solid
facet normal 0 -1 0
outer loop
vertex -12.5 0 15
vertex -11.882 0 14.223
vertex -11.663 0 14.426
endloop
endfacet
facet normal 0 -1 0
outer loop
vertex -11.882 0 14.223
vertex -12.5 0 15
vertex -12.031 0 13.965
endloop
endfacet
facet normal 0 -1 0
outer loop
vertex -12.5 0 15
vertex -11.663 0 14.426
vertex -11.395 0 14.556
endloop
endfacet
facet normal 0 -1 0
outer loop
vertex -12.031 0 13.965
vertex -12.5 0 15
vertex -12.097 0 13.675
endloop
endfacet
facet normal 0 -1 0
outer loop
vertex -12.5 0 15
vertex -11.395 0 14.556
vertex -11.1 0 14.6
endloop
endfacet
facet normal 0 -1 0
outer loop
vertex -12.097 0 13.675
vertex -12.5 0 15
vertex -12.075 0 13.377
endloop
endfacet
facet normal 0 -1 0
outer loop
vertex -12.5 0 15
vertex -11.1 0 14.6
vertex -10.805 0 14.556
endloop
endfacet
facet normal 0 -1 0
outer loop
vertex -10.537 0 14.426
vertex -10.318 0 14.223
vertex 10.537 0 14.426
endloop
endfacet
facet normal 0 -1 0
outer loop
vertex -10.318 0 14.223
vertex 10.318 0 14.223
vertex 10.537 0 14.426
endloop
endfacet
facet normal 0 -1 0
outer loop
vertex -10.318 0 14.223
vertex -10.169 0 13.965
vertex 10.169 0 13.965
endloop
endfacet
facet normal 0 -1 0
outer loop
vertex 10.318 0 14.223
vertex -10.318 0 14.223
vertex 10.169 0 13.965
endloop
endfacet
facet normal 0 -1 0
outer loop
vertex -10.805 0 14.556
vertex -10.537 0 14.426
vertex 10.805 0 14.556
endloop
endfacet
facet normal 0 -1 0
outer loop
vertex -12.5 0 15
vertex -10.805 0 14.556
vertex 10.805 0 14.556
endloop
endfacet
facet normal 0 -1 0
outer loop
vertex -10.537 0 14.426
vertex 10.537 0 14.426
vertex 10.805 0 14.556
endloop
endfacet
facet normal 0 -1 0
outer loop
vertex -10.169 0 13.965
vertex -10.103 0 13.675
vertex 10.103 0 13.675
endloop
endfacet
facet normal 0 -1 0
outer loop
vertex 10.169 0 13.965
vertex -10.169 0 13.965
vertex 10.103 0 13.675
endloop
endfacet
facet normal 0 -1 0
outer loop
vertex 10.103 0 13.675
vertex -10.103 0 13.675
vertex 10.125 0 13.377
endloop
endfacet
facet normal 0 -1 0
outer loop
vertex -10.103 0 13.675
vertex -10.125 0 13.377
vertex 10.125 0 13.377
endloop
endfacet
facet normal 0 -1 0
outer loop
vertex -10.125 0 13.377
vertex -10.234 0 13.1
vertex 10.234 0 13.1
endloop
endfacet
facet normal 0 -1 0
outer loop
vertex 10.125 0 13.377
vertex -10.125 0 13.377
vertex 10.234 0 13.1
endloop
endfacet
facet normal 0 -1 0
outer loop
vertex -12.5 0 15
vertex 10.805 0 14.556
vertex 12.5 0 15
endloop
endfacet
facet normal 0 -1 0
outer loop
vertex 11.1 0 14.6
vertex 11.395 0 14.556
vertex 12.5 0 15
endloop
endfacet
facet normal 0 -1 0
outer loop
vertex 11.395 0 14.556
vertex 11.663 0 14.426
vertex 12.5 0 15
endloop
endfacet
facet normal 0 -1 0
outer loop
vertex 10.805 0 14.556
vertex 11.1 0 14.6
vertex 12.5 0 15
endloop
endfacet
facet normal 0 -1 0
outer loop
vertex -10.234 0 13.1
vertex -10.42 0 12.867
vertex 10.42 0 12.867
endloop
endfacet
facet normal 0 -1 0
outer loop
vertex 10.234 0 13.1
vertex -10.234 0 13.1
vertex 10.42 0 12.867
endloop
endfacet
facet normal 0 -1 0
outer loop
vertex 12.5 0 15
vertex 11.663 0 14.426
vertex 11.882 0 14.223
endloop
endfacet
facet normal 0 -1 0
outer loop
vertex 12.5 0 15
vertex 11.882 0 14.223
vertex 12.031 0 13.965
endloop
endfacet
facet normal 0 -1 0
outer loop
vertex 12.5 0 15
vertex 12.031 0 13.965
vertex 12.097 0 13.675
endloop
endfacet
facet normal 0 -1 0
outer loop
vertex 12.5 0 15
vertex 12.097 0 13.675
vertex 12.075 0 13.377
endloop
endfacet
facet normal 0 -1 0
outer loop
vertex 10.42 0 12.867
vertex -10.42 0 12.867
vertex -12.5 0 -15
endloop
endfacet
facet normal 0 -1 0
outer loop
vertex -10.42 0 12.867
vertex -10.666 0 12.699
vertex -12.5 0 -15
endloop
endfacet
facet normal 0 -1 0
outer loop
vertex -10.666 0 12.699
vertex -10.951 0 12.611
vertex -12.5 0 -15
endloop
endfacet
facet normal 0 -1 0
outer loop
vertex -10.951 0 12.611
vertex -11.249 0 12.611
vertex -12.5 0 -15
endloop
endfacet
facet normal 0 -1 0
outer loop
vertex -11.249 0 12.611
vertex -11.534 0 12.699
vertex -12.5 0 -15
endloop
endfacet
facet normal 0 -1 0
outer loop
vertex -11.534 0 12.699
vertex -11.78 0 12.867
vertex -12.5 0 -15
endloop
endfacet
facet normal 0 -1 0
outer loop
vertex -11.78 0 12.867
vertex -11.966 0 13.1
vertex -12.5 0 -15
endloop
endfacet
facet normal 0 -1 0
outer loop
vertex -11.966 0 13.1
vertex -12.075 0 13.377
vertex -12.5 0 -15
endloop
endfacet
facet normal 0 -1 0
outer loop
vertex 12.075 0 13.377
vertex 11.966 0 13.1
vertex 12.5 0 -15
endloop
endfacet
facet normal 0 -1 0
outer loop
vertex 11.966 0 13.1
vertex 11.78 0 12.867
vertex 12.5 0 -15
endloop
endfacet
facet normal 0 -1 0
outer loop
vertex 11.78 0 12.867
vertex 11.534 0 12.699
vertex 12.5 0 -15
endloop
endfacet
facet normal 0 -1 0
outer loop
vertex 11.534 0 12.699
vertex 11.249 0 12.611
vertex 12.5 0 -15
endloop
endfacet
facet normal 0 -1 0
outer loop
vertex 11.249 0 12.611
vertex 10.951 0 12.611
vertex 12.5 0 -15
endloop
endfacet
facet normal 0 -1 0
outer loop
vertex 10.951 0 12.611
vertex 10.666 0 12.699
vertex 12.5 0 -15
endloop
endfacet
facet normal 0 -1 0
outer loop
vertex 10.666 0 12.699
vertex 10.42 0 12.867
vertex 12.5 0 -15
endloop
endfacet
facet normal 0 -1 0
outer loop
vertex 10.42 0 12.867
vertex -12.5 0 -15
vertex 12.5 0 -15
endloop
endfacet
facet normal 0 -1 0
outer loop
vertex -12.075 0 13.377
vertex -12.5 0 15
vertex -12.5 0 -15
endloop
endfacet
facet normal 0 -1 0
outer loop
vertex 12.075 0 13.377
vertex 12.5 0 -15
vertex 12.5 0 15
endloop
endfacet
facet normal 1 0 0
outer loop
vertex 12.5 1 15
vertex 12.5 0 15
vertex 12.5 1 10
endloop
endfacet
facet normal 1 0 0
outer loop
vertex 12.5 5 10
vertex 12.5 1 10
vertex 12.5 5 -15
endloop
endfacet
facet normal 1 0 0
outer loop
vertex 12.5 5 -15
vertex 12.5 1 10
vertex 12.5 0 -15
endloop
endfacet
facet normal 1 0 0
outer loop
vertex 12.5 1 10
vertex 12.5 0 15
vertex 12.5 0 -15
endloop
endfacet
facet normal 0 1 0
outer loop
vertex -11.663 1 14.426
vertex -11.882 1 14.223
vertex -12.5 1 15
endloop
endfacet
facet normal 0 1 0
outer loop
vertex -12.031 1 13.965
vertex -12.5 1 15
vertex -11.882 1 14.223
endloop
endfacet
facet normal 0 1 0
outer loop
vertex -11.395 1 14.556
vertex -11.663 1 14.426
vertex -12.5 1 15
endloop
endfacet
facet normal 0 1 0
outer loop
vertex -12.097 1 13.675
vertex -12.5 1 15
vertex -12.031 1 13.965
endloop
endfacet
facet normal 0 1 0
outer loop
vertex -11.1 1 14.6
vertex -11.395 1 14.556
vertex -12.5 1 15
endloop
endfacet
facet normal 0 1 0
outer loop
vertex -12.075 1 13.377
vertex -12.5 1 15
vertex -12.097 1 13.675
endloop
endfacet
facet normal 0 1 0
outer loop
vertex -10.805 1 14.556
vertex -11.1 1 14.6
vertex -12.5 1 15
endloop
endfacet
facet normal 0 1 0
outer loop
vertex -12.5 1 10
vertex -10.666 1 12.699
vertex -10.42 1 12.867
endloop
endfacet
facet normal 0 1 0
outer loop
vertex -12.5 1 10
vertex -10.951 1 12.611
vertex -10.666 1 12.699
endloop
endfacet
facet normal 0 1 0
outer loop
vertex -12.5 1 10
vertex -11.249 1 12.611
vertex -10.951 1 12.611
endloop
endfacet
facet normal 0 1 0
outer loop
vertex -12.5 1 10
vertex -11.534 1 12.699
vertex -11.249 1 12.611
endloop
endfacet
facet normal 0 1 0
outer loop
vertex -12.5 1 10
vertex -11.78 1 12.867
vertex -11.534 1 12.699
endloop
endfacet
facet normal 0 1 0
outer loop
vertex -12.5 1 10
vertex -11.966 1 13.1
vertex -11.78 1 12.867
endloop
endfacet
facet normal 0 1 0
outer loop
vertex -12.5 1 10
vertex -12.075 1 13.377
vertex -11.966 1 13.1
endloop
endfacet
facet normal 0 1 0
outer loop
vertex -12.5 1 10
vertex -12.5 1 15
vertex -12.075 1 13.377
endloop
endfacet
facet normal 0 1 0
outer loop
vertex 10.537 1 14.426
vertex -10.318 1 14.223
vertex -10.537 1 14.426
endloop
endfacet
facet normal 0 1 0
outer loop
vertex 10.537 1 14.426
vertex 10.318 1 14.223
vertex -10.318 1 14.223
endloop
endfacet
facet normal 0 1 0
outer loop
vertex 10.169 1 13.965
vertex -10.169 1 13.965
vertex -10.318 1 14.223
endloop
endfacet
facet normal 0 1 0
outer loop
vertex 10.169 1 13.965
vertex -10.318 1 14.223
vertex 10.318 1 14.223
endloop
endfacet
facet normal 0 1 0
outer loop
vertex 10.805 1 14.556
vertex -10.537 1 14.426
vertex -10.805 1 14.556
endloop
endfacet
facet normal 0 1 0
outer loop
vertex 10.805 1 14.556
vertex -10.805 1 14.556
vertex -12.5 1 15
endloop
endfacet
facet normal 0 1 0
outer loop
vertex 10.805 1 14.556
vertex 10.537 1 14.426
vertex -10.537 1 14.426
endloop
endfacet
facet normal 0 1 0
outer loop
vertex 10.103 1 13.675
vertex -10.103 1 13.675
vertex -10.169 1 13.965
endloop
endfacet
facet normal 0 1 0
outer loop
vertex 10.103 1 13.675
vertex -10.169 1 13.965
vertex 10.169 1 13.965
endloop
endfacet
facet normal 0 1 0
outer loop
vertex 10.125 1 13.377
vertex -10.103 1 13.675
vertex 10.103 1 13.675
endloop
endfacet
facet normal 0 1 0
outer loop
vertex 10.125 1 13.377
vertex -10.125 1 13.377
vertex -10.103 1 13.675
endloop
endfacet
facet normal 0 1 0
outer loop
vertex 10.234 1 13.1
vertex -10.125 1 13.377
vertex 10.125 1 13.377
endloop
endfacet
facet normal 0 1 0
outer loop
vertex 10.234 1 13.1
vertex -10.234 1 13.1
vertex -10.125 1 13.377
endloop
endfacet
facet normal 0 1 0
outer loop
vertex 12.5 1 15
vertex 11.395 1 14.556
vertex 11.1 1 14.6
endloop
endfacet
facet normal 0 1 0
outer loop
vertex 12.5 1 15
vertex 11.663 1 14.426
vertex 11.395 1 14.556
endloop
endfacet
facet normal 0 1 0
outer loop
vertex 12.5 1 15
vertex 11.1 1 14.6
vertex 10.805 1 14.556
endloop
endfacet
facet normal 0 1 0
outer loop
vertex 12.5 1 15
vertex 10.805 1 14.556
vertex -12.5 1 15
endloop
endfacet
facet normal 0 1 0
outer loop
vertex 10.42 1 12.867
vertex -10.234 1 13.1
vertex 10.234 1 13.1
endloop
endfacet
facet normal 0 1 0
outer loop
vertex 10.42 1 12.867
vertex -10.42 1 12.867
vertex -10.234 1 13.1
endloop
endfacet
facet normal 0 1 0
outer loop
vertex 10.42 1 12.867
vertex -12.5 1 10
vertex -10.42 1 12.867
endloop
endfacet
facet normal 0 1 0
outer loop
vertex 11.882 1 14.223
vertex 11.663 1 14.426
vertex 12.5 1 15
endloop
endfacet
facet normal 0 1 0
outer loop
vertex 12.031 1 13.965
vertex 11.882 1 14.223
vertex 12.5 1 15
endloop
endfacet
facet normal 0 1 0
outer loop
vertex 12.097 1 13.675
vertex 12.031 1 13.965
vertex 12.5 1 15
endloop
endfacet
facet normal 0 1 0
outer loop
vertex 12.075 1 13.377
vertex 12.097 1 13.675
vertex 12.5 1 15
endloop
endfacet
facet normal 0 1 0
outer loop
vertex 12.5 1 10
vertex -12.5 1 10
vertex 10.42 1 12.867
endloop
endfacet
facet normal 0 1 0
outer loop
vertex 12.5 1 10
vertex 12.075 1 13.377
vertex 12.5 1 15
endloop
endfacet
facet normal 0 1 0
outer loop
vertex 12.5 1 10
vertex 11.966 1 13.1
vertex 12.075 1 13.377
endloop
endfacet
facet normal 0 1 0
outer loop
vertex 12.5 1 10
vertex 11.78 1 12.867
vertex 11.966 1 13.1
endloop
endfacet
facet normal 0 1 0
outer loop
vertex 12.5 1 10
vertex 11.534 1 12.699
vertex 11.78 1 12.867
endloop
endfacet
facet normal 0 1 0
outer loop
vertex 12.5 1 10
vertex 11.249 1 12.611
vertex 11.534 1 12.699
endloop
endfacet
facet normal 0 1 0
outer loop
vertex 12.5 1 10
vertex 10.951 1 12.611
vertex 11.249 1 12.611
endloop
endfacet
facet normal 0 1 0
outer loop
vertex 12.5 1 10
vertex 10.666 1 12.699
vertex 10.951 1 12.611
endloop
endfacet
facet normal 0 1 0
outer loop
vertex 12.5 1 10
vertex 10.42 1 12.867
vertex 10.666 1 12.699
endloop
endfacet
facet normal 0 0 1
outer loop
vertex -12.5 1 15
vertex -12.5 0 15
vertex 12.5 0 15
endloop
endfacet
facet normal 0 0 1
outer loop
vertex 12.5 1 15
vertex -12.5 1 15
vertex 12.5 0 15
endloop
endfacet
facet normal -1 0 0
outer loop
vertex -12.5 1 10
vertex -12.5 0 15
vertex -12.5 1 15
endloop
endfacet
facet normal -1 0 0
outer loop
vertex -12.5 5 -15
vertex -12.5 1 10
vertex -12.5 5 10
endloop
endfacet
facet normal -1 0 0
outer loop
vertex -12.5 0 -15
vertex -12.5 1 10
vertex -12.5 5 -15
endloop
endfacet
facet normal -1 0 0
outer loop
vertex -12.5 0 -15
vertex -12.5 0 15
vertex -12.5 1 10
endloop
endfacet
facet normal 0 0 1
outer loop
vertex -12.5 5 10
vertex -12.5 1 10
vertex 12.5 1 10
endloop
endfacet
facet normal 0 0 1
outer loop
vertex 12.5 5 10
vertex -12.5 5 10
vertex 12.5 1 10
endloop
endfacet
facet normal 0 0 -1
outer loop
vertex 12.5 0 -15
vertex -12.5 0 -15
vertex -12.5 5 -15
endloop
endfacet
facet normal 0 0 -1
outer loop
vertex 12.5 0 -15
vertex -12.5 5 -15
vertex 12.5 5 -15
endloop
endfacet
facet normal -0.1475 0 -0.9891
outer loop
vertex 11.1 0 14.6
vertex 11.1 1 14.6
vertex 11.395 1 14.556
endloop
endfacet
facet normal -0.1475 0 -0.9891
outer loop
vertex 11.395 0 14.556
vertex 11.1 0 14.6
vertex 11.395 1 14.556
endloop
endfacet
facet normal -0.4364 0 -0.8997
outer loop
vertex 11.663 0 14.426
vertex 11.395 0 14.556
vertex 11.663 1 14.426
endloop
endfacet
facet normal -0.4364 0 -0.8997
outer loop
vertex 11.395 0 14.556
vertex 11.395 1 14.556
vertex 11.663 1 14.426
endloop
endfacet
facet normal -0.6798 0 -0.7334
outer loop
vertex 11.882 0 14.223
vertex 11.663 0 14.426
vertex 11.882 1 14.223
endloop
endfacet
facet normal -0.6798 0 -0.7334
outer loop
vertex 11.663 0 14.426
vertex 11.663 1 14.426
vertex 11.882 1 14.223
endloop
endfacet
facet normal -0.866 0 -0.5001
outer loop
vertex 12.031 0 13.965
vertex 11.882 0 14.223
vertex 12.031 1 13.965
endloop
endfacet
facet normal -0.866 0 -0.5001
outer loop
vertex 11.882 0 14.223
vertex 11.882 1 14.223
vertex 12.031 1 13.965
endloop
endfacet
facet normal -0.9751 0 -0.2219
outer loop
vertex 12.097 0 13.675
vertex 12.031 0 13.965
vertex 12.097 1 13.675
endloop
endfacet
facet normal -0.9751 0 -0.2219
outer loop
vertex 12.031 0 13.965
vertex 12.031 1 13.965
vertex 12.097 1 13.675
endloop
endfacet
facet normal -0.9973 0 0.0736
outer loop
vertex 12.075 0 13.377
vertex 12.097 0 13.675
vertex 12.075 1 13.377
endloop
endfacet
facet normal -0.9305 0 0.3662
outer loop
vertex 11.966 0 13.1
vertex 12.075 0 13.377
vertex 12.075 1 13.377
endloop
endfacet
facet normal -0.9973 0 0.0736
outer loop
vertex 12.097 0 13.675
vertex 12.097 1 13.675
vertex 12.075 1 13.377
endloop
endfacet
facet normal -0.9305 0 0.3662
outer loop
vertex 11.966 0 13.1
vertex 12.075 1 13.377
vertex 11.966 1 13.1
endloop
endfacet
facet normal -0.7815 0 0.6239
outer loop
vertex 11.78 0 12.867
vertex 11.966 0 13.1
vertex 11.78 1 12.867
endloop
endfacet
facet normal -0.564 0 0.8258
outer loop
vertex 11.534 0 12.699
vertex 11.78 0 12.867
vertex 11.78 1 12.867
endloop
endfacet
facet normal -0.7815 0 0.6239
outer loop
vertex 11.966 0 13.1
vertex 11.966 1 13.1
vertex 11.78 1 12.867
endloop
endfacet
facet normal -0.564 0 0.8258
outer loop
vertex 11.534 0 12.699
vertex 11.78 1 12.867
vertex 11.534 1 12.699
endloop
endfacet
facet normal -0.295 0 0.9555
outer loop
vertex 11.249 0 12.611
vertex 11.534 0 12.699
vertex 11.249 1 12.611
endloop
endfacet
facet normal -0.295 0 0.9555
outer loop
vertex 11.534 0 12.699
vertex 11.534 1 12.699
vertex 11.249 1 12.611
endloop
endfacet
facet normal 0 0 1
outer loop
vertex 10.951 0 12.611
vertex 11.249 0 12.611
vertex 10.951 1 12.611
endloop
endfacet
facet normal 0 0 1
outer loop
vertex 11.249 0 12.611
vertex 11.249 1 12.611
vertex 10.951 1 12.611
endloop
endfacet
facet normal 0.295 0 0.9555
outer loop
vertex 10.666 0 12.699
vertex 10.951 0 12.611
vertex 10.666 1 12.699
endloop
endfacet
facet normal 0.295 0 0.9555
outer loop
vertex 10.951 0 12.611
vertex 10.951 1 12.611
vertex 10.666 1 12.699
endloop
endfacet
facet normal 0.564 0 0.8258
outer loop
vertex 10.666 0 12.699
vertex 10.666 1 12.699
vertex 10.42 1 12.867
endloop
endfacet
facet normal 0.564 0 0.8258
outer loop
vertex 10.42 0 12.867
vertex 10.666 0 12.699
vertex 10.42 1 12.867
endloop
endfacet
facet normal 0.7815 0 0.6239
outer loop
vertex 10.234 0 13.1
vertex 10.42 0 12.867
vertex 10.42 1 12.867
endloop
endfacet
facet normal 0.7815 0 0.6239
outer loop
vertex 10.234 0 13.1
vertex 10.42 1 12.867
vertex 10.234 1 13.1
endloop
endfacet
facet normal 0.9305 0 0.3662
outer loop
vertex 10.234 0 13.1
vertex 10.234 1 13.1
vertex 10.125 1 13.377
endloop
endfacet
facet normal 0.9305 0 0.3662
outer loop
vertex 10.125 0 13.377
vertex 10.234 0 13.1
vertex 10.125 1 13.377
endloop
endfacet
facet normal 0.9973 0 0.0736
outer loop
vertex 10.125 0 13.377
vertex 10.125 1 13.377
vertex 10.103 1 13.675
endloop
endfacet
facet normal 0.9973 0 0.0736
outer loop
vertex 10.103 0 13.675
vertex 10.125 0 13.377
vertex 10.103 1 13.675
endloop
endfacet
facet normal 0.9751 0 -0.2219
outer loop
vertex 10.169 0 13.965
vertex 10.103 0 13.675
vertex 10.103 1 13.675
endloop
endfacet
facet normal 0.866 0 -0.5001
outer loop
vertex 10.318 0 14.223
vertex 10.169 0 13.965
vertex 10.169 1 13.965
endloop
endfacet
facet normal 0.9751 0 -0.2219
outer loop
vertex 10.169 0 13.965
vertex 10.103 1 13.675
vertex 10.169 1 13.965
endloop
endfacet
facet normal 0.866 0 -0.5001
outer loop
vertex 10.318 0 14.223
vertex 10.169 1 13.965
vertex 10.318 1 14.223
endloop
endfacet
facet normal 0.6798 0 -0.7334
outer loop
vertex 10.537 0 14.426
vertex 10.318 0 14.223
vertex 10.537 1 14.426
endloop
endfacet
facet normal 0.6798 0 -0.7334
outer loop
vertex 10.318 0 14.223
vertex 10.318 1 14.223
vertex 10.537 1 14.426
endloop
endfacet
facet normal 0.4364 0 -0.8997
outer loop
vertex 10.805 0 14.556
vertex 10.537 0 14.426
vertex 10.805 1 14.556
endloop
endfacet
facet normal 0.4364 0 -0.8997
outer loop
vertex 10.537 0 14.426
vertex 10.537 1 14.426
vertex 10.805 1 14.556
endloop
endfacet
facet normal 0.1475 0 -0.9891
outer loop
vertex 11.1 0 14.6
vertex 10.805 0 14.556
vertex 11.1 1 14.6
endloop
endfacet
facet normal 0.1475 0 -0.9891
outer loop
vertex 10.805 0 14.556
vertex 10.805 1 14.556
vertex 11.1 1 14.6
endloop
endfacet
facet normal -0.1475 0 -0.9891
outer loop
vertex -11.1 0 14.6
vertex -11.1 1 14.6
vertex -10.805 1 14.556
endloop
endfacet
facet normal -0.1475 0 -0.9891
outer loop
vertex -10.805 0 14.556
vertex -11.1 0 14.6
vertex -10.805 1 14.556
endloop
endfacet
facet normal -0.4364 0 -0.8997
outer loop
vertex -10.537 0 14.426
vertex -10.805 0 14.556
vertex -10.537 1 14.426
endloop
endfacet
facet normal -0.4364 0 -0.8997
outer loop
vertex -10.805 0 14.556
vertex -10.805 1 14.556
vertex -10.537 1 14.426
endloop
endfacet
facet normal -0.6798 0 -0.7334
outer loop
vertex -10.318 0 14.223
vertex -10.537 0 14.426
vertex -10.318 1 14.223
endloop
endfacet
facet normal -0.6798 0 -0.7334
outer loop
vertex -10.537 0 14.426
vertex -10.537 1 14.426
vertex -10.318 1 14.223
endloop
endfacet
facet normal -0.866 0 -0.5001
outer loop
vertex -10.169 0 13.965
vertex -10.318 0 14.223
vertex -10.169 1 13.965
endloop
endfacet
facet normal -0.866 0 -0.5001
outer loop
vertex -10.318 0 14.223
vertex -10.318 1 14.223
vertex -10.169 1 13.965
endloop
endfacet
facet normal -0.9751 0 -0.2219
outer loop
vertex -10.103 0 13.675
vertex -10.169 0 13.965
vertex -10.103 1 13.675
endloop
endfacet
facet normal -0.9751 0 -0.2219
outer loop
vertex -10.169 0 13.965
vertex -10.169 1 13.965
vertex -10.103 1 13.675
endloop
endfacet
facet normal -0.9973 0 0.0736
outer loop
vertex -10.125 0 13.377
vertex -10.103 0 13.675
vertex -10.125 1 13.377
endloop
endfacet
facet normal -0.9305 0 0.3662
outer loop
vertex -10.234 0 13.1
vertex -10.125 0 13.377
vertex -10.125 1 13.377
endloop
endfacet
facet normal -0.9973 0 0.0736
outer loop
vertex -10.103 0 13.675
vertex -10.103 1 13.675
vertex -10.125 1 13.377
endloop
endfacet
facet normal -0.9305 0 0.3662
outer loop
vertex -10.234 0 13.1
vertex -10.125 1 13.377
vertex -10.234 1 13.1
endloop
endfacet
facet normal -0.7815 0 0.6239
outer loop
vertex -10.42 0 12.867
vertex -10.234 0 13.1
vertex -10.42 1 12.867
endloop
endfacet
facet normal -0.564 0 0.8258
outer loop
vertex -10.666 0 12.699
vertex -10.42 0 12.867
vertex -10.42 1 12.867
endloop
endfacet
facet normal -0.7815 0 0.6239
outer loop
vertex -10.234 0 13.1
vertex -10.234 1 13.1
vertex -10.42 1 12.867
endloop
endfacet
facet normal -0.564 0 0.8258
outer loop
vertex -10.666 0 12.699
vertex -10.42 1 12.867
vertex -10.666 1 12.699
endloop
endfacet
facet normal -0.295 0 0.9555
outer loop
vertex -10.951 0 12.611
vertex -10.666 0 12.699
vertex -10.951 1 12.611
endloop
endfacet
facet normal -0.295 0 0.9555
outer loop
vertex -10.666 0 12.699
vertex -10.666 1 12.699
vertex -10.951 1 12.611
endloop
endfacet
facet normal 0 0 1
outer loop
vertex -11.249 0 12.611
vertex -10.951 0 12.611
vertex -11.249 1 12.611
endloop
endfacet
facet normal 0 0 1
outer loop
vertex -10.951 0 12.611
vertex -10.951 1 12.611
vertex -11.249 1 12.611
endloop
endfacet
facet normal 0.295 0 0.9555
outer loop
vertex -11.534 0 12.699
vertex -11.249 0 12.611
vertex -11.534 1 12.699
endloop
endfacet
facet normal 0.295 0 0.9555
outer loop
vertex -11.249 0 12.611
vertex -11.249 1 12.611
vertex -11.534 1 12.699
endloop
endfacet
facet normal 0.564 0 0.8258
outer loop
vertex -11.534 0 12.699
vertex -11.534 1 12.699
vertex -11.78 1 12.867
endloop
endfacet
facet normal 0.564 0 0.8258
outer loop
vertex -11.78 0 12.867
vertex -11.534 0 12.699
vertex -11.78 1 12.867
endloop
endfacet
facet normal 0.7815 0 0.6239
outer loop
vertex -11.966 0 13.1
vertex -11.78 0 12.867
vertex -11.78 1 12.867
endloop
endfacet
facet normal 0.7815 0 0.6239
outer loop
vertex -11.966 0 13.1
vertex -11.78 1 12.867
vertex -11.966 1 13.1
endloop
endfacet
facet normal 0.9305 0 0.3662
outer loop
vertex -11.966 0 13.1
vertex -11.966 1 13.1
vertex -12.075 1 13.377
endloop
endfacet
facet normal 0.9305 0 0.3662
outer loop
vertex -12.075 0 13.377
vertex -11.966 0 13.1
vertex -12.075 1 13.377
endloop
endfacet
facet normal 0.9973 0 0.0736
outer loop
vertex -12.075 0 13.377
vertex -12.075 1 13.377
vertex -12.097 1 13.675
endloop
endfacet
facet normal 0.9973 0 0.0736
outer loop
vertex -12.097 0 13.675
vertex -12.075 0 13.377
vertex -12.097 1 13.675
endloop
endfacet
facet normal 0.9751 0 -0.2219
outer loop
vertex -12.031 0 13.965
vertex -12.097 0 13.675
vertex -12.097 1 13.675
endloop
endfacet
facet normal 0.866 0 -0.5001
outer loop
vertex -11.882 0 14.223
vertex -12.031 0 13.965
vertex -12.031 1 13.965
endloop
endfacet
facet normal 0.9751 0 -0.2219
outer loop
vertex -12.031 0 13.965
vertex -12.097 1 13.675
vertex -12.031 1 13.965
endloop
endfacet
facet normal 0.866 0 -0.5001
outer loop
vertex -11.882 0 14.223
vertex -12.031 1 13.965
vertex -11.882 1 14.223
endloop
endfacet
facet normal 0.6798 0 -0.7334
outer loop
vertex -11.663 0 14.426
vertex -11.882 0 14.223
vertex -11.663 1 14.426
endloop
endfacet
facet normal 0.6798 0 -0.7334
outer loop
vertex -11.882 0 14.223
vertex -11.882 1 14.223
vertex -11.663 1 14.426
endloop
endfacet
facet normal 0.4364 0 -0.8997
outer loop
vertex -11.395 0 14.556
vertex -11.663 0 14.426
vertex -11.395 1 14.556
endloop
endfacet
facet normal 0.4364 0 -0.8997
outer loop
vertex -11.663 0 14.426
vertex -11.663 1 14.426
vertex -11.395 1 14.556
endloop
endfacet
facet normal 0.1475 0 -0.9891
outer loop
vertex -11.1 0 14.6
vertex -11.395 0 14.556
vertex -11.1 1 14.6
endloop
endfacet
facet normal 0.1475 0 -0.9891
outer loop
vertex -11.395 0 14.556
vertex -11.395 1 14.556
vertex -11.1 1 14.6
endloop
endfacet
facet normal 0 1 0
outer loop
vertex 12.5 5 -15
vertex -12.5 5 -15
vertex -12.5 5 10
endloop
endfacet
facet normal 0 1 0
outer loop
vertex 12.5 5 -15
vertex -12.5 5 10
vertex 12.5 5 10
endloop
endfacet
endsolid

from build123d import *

# Parameters (mm, degrees)
SKETCH_1_W          = 25
SKETCH_1_H          = 30
EXTRUDE_1_DEPTH     = 1
SKETCH_2_W          = 25
SKETCH_2_H          = 25
EXTRUDE_2_DEPTH     = 4
SKETCH_3_R          = 1
CUT_EXTRUDE_1_DEPTH = 1


with BuildPart() as part:
    # 草图1 → 凸台-拉伸1 (new body)
    with BuildSketch(Plane(origin=(0, 0, 0), x_dir=(1, 0, 0), z_dir=(0, 1, 0))):
        Rectangle(SKETCH_1_W, SKETCH_1_H)
    extrude(amount=EXTRUDE_1_DEPTH)

    # 草图2 → 凸台-拉伸2 (add)
    with BuildSketch(Plane(origin=(0, 1, 0), x_dir=(1, 0, 0), z_dir=(0, 1, 0))):
        with Locations((0, 2.5)):
            Rectangle(SKETCH_2_W, SKETCH_2_H)
    extrude(amount=EXTRUDE_2_DEPTH)

    # 草图3 → 切除-拉伸1 (cut)
    with BuildSketch(Plane(origin=(0, 1, 0), x_dir=(1, 0, 0), z_dir=(0, 1, 0))):
        with Locations(Location((-11.1, -13.6, 0), (0, 0, 270))):
            Circle(SKETCH_3_R)
        with Locations(Location((11.1, -13.6, 0), (0, 0, 270))):
            Circle(SKETCH_3_R)
    extrude(amount=-CUT_EXTRUDE_1_DEPTH, mode=Mode.SUBTRACT)


solid = part.part
